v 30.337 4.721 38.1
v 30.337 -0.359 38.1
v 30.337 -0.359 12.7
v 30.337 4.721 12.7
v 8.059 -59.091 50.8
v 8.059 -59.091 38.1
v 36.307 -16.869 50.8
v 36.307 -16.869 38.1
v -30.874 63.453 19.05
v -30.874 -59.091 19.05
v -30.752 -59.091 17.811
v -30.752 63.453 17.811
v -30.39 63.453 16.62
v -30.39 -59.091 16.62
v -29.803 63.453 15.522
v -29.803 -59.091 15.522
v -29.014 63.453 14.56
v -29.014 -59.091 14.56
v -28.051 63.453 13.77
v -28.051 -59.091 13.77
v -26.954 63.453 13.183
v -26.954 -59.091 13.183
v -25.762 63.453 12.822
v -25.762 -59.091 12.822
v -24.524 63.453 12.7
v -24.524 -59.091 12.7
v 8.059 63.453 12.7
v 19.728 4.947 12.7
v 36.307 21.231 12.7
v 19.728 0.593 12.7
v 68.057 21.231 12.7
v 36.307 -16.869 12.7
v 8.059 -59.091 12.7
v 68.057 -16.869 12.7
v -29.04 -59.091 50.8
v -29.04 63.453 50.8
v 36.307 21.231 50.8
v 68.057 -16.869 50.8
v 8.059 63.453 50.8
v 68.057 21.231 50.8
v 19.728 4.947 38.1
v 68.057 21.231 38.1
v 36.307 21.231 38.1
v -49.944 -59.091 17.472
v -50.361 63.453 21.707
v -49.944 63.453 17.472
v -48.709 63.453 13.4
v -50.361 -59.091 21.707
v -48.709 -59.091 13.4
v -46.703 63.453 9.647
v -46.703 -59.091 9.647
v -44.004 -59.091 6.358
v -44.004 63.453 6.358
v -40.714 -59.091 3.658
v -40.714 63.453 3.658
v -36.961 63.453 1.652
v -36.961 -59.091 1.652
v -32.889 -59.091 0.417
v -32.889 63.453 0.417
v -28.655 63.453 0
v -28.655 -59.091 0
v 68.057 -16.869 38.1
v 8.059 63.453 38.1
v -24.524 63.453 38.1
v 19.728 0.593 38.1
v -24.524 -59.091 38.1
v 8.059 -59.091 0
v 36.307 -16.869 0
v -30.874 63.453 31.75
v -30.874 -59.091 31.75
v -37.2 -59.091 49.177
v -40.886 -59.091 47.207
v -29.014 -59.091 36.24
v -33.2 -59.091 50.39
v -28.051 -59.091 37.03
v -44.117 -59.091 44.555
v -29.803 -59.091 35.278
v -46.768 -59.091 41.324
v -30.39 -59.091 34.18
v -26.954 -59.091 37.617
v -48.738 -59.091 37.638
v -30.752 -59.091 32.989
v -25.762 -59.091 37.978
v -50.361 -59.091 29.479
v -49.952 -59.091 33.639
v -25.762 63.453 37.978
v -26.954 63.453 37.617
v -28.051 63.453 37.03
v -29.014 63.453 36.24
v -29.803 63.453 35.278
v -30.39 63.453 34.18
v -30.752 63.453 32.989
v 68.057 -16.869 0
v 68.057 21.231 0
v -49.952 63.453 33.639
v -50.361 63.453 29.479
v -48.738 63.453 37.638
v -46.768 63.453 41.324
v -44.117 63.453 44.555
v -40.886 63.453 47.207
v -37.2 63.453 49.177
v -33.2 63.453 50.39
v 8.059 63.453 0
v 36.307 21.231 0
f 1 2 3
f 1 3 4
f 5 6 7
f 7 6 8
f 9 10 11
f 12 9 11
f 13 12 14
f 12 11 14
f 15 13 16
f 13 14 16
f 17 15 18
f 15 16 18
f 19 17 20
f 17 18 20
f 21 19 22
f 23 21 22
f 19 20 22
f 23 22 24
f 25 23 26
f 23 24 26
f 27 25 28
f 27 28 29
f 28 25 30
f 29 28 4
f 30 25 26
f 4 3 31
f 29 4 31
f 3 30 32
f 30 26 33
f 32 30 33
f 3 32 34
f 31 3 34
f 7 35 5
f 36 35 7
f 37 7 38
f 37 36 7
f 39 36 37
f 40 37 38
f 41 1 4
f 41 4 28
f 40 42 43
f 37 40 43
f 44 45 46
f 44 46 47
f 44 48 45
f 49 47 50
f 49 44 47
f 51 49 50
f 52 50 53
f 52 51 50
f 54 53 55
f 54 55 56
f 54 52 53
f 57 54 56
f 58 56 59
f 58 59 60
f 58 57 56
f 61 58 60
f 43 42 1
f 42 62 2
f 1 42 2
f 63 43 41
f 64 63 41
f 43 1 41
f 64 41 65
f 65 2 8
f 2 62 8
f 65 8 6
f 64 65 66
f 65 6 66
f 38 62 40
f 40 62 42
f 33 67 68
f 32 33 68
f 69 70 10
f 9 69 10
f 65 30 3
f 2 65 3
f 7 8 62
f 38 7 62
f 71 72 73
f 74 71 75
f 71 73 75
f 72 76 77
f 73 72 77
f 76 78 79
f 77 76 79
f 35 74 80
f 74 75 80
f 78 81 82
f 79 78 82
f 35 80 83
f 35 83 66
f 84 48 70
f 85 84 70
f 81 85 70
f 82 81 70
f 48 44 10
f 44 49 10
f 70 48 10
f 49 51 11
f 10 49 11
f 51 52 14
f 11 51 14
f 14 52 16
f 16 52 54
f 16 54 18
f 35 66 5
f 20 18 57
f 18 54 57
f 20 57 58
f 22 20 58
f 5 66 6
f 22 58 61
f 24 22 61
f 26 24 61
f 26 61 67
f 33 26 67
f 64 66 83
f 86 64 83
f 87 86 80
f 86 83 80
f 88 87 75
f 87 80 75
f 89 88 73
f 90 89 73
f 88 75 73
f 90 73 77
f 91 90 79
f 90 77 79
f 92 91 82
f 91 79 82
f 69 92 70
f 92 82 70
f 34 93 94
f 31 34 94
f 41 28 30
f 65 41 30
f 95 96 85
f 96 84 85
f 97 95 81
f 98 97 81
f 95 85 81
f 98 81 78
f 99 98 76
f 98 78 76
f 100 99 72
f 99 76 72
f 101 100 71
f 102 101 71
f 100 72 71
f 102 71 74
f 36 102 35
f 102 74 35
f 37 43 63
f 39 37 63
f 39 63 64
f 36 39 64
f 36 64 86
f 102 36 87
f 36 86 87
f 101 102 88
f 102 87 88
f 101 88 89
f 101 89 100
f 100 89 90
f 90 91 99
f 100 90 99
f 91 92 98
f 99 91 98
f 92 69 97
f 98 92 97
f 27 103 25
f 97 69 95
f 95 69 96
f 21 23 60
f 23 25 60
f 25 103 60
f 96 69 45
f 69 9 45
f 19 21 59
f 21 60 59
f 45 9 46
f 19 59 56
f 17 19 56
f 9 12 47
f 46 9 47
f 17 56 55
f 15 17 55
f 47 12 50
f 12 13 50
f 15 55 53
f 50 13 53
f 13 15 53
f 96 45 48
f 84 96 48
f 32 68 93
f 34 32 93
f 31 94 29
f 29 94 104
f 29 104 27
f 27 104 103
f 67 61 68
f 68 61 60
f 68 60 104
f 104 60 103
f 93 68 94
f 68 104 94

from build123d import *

# Parameters (mm, degrees)
F1_DEPTH = 50.8
F2_R     = 21.706798
F3_R     = 21.320862
F5_DEPTH = 157.70323
F7_DEPTH = 29.04742


with BuildPart() as f1:
    # F0 (on Top) → F1 (new body)
    with BuildSketch(Plane.XY):
        Polygon((68.056519, -16.868673), (68.056519, 21.231327), (36.306519, 21.231327), (8.058664, 63.453343), (-50.361336, 63.453343), (-50.361336, -59.09069), (8.058664, -59.09069), (36.306519, -16.868673), align=None)
    extrude(amount=F1_DEPTH)

    # F2
    f2_edges = [f1.edges().sort_by_distance(p)[0] for p in [
        (-50.361336, 2.181327, 0),
    ]]
    fillet(f2_edges, radius=F2_R)

    # F3
    f3_edges = [f1.edges().sort_by_distance(p)[0] for p in [
        (-50.361336, 2.181327, 50.8),
    ]]
    fillet(f3_edges, radius=F3_R)

    # F4 (on face) → F5 (cut)
    with BuildSketch(Plane.XZ.offset(59.09069)):
        with BuildLine():
            Line((99.388748, 38.1), (8.058664, 38.1))
            Line((8.058664, 38.1), (-24.523535, 38.1))
            ThreePointArc((-24.523535, 38.1), (-29.013663, 36.240128), (-30.873535, 31.75))
            Line((-30.873535, 31.75), (-30.873535, 19.05))
            ThreePointArc((-30.873535, 19.05), (-29.013663, 14.559872), (-24.523535, 12.7))
            Line((-24.523535, 12.7), (8.058664, 12.7))
            Line((8.058664, 12.7), (99.388748, 12.7))
            Line((99.388748, 12.7), (99.388748, 38.1))
        make_face()
        with BuildLine():
            Line((8.058664, 12.7), (8.058664, 38.1))
            Line((8.058664, 38.1), (-24.523535, 38.1))
            ThreePointArc((-24.523535, 38.1), (-29.013663, 36.240128), (-30.873535, 31.75))
            Line((-30.873535, 31.75), (-30.873535, 19.05))
            ThreePointArc((-30.873535, 19.05), (-29.013663, 14.559872), (-24.523535, 12.7))
            Line((-24.523535, 12.7), (8.058664, 12.7))
        make_face()
    extrude(amount=-F5_DEPTH, mode=Mode.SUBTRACT)

    # F6 (on face) → F7 (join)
    with BuildSketch(Plane.XY.offset(12.7)):
        Polygon((19.727962, 4.946723), (19.727962, 0.592731), (30.337321, -0.358673), (30.337321, 4.721327), align=None)
    extrude(amount=F7_DEPTH)


solid = f1.part
